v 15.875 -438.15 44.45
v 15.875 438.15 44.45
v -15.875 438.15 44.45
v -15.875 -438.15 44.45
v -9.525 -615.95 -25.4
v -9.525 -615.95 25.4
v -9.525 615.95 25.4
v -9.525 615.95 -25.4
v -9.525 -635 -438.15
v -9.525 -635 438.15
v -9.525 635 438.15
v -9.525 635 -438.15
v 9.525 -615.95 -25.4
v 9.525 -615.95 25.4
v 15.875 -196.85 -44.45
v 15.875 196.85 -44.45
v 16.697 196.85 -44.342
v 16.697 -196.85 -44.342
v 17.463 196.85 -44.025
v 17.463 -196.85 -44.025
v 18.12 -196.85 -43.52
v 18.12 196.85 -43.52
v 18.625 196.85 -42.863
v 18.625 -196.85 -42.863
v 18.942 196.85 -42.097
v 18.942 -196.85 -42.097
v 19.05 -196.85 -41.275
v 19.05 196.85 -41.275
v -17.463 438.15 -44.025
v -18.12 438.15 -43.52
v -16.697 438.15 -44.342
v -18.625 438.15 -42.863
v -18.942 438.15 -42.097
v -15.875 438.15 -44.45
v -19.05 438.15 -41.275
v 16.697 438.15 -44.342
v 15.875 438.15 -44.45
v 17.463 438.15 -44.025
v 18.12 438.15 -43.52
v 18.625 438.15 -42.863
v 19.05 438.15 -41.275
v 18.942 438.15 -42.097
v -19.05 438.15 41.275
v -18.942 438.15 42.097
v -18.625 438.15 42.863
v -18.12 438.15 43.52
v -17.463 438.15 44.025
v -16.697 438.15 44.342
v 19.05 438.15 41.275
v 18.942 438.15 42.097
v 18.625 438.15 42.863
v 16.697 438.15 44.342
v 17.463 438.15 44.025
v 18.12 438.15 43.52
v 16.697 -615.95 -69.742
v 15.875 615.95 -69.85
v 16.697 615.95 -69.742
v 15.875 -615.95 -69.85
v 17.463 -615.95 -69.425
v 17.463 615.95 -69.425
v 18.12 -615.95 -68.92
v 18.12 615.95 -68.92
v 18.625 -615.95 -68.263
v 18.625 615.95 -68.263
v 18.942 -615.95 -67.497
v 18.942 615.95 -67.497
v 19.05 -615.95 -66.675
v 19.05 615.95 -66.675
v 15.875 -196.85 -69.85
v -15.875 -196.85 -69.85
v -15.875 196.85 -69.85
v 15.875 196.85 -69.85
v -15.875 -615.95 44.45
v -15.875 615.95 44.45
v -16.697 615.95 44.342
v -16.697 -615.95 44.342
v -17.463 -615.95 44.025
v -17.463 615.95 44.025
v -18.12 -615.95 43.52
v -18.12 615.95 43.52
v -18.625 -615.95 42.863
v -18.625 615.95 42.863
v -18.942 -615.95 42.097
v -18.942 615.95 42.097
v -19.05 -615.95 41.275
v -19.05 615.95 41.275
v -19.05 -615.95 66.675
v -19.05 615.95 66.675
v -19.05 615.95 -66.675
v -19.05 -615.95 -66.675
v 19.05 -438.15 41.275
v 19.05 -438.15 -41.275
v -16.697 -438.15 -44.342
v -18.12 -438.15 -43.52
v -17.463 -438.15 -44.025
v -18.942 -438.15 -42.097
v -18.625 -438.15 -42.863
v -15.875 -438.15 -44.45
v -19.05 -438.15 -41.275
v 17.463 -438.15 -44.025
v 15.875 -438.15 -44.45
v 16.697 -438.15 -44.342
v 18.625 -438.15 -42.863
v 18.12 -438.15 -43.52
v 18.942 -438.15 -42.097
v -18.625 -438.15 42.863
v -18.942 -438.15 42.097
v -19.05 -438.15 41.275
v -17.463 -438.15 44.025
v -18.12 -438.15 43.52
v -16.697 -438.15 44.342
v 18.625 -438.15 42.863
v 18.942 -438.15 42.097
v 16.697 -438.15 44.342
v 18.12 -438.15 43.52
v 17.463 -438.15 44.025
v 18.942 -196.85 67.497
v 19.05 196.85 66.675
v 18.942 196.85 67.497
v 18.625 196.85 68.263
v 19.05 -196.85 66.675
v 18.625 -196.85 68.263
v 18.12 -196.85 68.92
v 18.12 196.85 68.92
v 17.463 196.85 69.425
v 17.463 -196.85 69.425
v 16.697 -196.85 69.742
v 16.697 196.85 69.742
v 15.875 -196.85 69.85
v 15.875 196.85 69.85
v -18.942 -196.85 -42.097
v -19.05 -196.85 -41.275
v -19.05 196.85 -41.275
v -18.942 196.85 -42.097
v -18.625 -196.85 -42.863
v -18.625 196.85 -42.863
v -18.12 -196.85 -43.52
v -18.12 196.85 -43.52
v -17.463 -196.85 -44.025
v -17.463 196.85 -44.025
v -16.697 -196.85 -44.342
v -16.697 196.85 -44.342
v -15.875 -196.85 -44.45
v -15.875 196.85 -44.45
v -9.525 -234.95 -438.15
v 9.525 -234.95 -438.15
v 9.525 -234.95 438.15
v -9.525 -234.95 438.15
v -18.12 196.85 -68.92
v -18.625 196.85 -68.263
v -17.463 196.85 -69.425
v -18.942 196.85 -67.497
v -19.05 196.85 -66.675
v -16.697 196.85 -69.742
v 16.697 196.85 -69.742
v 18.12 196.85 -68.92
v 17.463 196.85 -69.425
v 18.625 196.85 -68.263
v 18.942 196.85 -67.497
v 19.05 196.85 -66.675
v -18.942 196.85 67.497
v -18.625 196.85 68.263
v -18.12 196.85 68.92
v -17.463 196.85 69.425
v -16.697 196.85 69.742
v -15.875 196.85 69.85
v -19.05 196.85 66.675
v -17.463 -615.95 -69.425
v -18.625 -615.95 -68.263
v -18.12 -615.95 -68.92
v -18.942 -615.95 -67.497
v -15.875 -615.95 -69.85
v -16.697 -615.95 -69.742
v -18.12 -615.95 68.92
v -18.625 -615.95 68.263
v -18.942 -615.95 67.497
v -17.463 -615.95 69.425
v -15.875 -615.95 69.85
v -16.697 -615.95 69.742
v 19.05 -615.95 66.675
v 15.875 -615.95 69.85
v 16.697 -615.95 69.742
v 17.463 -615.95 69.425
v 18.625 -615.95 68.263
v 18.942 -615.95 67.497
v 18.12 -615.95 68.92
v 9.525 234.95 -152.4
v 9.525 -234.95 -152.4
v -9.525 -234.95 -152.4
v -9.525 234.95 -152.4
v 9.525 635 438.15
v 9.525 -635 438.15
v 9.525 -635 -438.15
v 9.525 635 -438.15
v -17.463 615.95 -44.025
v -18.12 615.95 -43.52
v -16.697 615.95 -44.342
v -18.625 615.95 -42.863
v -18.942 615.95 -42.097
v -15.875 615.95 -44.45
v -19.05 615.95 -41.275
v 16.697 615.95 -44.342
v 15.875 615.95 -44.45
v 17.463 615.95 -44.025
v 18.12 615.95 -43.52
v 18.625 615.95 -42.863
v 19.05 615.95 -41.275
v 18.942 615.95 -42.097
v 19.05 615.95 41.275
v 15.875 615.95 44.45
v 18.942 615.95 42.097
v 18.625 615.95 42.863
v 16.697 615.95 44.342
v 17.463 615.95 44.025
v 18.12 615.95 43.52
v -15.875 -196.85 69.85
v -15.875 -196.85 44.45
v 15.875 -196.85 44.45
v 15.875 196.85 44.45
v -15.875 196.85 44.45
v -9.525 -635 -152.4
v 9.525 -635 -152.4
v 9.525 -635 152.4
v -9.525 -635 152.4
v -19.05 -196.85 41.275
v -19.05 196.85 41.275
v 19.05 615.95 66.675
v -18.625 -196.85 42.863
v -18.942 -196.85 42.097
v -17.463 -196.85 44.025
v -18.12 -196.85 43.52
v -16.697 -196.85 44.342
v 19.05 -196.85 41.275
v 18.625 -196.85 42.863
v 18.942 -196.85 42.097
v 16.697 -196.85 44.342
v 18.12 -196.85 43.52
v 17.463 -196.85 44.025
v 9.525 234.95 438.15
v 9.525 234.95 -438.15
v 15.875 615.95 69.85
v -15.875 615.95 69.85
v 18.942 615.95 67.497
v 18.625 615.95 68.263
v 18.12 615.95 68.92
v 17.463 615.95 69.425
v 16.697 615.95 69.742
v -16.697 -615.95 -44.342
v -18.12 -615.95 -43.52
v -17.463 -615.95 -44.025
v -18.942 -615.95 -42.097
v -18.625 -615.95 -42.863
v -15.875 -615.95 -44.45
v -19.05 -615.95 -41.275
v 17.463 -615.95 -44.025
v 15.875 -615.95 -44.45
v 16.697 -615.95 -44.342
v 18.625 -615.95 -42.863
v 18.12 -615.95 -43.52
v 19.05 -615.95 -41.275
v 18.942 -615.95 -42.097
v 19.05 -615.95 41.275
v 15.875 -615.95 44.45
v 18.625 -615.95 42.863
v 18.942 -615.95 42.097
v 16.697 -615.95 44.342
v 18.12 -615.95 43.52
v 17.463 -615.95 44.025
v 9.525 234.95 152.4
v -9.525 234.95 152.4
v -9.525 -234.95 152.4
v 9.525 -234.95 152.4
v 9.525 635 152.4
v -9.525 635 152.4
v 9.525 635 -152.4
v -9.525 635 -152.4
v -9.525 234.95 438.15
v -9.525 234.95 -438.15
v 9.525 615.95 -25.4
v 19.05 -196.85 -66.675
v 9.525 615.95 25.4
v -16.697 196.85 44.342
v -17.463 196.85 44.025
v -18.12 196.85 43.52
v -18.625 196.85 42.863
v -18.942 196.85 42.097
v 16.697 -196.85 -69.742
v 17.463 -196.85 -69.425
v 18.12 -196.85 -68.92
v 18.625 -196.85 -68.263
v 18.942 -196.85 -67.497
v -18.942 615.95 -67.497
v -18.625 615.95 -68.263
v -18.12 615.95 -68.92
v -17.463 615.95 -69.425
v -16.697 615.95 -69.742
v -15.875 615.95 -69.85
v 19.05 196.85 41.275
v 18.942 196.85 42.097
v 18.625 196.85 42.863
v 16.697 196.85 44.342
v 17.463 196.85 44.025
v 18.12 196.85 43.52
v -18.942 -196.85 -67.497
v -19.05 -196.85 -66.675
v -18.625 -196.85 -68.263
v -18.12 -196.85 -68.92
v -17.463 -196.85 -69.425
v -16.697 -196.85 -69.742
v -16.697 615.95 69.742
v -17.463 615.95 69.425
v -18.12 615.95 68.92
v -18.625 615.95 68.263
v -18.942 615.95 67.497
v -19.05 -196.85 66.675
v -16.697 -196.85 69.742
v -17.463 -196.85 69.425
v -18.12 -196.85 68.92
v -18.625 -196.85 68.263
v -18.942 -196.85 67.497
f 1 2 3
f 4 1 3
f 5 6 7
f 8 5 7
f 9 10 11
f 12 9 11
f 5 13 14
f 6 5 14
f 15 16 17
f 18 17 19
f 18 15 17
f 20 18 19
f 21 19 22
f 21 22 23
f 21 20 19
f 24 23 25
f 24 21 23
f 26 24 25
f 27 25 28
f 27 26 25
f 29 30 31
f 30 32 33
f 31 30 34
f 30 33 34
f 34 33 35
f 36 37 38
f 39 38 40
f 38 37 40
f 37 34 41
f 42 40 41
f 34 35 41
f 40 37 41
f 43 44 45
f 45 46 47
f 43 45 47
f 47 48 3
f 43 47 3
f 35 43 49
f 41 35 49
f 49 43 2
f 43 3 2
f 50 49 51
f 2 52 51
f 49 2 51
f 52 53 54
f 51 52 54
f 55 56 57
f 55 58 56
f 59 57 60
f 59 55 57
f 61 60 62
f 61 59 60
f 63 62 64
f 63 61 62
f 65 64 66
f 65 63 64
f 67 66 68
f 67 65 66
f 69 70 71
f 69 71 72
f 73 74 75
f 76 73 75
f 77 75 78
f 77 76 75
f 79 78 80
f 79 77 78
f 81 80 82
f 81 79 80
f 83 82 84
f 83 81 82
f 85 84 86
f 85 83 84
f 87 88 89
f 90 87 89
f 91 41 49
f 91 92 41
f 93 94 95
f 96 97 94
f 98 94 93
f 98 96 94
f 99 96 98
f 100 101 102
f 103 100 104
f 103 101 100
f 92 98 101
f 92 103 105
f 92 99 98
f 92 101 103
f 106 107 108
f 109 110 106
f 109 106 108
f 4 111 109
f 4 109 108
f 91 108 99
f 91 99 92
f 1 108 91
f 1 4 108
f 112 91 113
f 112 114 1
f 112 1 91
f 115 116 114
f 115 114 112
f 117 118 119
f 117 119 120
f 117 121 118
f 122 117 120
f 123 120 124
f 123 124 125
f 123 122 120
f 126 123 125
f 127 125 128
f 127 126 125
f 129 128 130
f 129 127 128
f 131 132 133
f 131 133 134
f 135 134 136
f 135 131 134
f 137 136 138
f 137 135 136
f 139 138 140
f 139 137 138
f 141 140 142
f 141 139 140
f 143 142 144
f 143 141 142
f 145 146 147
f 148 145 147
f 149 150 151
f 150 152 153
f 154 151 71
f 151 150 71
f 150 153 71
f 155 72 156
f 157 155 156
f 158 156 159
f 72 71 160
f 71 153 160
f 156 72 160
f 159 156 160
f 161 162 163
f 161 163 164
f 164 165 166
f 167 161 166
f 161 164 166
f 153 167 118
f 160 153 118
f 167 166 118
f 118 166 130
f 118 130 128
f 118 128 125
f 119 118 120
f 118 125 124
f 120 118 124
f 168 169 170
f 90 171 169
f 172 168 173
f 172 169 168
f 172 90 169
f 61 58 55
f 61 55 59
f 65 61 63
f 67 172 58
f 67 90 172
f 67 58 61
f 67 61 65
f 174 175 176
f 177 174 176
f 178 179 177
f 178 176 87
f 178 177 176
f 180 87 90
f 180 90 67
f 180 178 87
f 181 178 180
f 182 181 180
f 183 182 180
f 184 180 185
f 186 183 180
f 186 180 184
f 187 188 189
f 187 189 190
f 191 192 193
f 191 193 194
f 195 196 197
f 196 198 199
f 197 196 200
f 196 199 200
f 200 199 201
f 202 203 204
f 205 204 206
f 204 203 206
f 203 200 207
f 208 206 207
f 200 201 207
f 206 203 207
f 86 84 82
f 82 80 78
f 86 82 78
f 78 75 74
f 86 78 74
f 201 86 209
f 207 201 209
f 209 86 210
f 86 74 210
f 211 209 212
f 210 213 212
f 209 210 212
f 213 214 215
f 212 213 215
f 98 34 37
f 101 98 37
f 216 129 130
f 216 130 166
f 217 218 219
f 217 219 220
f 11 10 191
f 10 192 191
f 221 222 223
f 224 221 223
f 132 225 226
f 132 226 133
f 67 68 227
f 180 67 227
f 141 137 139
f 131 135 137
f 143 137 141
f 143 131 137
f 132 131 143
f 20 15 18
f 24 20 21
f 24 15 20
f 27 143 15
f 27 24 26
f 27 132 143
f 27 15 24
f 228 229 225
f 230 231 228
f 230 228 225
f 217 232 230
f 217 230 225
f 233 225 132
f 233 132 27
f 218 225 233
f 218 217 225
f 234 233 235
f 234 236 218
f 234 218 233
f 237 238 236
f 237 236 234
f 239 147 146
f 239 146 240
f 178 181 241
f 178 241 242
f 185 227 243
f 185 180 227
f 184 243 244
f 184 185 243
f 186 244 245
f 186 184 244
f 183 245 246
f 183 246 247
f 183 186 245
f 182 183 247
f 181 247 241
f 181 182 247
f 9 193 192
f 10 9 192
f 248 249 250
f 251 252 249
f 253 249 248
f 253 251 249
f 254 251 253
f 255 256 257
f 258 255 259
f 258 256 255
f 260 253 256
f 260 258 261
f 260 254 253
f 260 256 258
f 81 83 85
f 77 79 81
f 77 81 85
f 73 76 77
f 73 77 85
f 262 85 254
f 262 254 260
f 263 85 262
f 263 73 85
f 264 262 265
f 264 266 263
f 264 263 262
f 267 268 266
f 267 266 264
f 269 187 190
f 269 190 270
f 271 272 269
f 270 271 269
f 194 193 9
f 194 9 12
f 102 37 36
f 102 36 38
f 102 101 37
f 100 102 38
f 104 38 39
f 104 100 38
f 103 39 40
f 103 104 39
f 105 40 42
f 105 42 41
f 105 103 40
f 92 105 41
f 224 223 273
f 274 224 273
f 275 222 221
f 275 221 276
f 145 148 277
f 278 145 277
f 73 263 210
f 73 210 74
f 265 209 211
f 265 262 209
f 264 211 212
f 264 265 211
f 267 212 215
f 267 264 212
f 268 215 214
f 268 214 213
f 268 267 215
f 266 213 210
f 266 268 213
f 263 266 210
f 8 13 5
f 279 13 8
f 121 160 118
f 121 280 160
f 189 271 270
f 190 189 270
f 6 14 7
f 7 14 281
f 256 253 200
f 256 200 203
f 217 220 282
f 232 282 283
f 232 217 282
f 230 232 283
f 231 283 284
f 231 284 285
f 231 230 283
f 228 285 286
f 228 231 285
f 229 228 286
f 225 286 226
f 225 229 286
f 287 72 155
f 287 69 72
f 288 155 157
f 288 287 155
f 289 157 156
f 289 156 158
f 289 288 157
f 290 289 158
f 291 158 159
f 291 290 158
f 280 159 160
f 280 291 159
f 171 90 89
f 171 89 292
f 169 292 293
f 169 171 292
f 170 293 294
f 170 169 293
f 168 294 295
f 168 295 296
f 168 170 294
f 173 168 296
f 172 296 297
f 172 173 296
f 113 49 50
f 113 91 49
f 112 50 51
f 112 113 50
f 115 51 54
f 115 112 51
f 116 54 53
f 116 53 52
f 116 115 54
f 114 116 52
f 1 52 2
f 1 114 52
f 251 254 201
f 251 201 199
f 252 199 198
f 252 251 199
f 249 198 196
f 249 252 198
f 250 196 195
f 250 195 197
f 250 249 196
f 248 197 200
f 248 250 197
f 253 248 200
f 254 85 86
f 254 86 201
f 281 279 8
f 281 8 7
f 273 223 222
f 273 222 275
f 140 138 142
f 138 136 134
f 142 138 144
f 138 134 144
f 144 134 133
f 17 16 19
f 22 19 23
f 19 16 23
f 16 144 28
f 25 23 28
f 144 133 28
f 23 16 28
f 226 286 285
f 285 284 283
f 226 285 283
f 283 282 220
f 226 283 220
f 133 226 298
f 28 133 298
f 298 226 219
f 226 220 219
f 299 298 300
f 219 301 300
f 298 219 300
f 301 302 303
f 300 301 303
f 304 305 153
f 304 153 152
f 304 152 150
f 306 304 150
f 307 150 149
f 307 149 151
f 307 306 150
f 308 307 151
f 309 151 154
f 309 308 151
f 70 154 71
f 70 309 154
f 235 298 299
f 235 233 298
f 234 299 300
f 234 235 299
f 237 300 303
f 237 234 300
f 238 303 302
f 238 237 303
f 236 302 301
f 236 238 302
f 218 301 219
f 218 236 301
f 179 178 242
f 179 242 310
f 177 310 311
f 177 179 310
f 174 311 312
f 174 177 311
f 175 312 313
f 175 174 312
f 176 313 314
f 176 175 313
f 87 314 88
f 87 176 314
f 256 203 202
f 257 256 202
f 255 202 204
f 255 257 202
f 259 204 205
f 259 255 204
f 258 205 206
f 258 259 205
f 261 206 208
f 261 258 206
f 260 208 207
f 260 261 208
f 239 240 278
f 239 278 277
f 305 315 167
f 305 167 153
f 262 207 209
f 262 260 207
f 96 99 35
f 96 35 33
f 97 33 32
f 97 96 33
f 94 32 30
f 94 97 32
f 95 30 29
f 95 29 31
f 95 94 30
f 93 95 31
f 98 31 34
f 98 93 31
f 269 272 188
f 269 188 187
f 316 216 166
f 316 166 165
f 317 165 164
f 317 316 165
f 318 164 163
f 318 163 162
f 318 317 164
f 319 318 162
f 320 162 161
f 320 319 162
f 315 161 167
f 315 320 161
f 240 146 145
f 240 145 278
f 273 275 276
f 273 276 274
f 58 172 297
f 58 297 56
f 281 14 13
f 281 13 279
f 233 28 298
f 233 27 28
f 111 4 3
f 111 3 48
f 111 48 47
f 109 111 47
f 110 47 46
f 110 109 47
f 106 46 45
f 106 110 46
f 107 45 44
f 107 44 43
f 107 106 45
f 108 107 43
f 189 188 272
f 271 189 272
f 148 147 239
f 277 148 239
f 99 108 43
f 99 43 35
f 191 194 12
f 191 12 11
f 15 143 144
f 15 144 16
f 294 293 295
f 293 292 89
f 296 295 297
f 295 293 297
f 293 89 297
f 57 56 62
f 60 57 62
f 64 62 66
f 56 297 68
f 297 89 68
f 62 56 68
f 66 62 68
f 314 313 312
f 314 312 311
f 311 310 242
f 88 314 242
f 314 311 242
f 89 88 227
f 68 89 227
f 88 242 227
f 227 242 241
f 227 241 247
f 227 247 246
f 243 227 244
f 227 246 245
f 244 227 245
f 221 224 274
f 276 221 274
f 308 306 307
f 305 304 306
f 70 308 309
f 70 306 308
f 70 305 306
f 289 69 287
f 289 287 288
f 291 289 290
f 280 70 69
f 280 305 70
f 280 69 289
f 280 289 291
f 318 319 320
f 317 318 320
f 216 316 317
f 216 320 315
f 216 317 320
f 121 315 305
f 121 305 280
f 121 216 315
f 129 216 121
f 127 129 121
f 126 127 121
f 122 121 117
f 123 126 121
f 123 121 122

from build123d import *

# Parameters (mm, degrees)
F1_DEPTH      = 196.85
F2_DEPTH      = 615.95
F4_DEPTH      = 196.85
F4_DEPTH_BACK = 196.85
F5_DEPTH      = 615.95
F5_DEPTH_BACK = 615.95
F7_DEPTH      = 438.15
F8_W          = 1270
F8_H          = 876.3
F9_DEPTH      = 9.525
F10_W         = 469.9
F10_H         = 876.3
F11_DEPTH     = 19.05
F12_W         = 1270
F12_H         = 304.8
F13_DEPTH     = 19.05
F14_W         = 469.9
F14_H         = 304.8
F15_DEPTH     = 19.05
F16_W         = 1231.9
F16_H         = 50.8
F17_DEPTH     = 19.05


with BuildPart() as f1:
    # F0 (on Front) → F1 (new body, symmetric)
    with BuildSketch(Plane.XZ):
        with BuildLine():
            ThreePointArc((19.05, 66.675), (18.1200640303, 68.9200640303), (15.875, 69.85))
            Line((15.875, 69.85), (-15.875, 69.85))
            ThreePointArc((-15.875, 69.85), (-18.1200640303, 68.9200640303), (-19.05, 66.675))
            Line((-19.05, 66.675), (-19.05, -66.675))
            ThreePointArc((-19.05, -66.675), (-18.1200640303, -68.9200640303), (-15.875, -69.85))
            Line((-15.875, -69.85), (15.875, -69.85))
            ThreePointArc((15.875, -69.85), (18.1200640303, -68.9200640303), (19.05, -66.675))
            Line((19.05, -66.675), (19.05, 66.675))
        make_face()
    extrude(amount=F1_DEPTH, both=True)


with BuildPart() as f2:
    # F0 (on Front) → F2 (new body, symmetric)
    with BuildSketch(Plane.XZ):
        with BuildLine():
            ThreePointArc((19.05, 66.675), (18.1200640303, 68.9200640303), (15.875, 69.85))
            Line((15.875, 69.85), (-15.875, 69.85))
            ThreePointArc((-15.875, 69.85), (-18.1200640303, 68.9200640303), (-19.05, 66.675))
            Line((-19.05, 66.675), (-19.05, -66.675))
            ThreePointArc((-19.05, -66.675), (-18.1200640303, -68.9200640303), (-15.875, -69.85))
            Line((-15.875, -69.85), (15.875, -69.85))
            ThreePointArc((15.875, -69.85), (18.1200640303, -68.9200640303), (19.05, -66.675))
            Line((19.05, -66.675), (19.05, 66.675))
        make_face()
    extrude(amount=F2_DEPTH, both=True)


with BuildPart() as f4:
    # F3 (on Front) → F4 (new body, two sides)
    with BuildSketch(Plane.XZ) as f4_sk:
        with BuildLine():
            ThreePointArc((19.05, 41.275), (18.1200640303, 43.5200640303), (15.875, 44.45))
            Line((15.875, 44.45), (-15.875, 44.45))
            ThreePointArc((-15.875, 44.45), (-18.1200640303, 43.5200640303), (-19.05, 41.275))
            Line((-19.05, 41.275), (-19.05, -41.275))
            ThreePointArc((-19.05, -41.275), (-18.1200640303, -43.5200640303), (-15.875, -44.45))
            Line((-15.875, -44.45), (15.875, -44.45))
            ThreePointArc((15.875, -44.45), (18.1200640303, -43.5200640303), (19.05, -41.275))
            Line((19.05, -41.275), (19.05, 41.275))
        make_face()
    extrude(amount=F4_DEPTH)
    extrude(f4_sk.sketch, amount=-F4_DEPTH_BACK)


with BuildPart() as f5:
    # F3 (on Front) → F5 (new body, two sides)
    with BuildSketch(Plane.XZ) as f5_sk:
        with BuildLine():
            ThreePointArc((19.05, 41.275), (18.1200640303, 43.5200640303), (15.875, 44.45))
            Line((15.875, 44.45), (-15.875, 44.45))
            ThreePointArc((-15.875, 44.45), (-18.1200640303, 43.5200640303), (-19.05, 41.275))
            Line((-19.05, 41.275), (-19.05, -41.275))
            ThreePointArc((-19.05, -41.275), (-18.1200640303, -43.5200640303), (-15.875, -44.45))
            Line((-15.875, -44.45), (15.875, -44.45))
            ThreePointArc((15.875, -44.45), (18.1200640303, -43.5200640303), (19.05, -41.275))
            Line((19.05, -41.275), (19.05, 41.275))
        make_face()
    extrude(amount=F5_DEPTH)
    extrude(f5_sk.sketch, amount=-F5_DEPTH_BACK)


with BuildPart() as f7:
    # F3 (on Front) → F7 (new body, symmetric)
    with BuildSketch(Plane.XZ):
        with BuildLine():
            ThreePointArc((19.05, 41.275), (18.1200640303, 43.5200640303), (15.875, 44.45))
            Line((15.875, 44.45), (-15.875, 44.45))
            ThreePointArc((-15.875, 44.45), (-18.1200640303, 43.5200640303), (-19.05, 41.275))
            Line((-19.05, 41.275), (-19.05, -41.275))
            ThreePointArc((-19.05, -41.275), (-18.1200640303, -43.5200640303), (-15.875, -44.45))
            Line((-15.875, -44.45), (15.875, -44.45))
            ThreePointArc((15.875, -44.45), (18.1200640303, -43.5200640303), (19.05, -41.275))
            Line((19.05, -41.275), (19.05, 41.275))
        make_face()
    extrude(amount=F7_DEPTH, both=True)


with BuildPart() as f9:
    # F8 (on Right) → F9 (new body, symmetric)
    with BuildSketch(Plane.YZ):
        Rectangle(F8_W, F8_H)
    extrude(amount=F9_DEPTH, both=True)


with BuildPart() as f11:
    # F10 (on face) → F11 (new body)
    with BuildSketch(Plane.YZ.offset(9.525)):
        Rectangle(F10_W, F10_H)
    extrude(amount=-F11_DEPTH)


with BuildPart() as f13:
    # F12 (on face) → F13 (new body)
    with BuildSketch(Plane.YZ.offset(9.525)):
        Rectangle(F12_W, F12_H)
    extrude(amount=-F13_DEPTH)


with BuildPart() as f15:
    # F14 (on face) → F15 (new body)
    with BuildSketch(Plane.YZ.offset(9.525)):
        Rectangle(F14_W, F14_H)
    extrude(amount=-F15_DEPTH)


with BuildPart() as f17:
    # F16 (on face) → F17 (new body)
    with BuildSketch(Plane.YZ.offset(9.525)):
        Rectangle(F16_W, F16_H)
    extrude(amount=-F17_DEPTH)


solid = Compound([f1.part, f2.part, f4.part, f5.part, f7.part, f9.part, f11.part, f13.part, f15.part, f17.part])
